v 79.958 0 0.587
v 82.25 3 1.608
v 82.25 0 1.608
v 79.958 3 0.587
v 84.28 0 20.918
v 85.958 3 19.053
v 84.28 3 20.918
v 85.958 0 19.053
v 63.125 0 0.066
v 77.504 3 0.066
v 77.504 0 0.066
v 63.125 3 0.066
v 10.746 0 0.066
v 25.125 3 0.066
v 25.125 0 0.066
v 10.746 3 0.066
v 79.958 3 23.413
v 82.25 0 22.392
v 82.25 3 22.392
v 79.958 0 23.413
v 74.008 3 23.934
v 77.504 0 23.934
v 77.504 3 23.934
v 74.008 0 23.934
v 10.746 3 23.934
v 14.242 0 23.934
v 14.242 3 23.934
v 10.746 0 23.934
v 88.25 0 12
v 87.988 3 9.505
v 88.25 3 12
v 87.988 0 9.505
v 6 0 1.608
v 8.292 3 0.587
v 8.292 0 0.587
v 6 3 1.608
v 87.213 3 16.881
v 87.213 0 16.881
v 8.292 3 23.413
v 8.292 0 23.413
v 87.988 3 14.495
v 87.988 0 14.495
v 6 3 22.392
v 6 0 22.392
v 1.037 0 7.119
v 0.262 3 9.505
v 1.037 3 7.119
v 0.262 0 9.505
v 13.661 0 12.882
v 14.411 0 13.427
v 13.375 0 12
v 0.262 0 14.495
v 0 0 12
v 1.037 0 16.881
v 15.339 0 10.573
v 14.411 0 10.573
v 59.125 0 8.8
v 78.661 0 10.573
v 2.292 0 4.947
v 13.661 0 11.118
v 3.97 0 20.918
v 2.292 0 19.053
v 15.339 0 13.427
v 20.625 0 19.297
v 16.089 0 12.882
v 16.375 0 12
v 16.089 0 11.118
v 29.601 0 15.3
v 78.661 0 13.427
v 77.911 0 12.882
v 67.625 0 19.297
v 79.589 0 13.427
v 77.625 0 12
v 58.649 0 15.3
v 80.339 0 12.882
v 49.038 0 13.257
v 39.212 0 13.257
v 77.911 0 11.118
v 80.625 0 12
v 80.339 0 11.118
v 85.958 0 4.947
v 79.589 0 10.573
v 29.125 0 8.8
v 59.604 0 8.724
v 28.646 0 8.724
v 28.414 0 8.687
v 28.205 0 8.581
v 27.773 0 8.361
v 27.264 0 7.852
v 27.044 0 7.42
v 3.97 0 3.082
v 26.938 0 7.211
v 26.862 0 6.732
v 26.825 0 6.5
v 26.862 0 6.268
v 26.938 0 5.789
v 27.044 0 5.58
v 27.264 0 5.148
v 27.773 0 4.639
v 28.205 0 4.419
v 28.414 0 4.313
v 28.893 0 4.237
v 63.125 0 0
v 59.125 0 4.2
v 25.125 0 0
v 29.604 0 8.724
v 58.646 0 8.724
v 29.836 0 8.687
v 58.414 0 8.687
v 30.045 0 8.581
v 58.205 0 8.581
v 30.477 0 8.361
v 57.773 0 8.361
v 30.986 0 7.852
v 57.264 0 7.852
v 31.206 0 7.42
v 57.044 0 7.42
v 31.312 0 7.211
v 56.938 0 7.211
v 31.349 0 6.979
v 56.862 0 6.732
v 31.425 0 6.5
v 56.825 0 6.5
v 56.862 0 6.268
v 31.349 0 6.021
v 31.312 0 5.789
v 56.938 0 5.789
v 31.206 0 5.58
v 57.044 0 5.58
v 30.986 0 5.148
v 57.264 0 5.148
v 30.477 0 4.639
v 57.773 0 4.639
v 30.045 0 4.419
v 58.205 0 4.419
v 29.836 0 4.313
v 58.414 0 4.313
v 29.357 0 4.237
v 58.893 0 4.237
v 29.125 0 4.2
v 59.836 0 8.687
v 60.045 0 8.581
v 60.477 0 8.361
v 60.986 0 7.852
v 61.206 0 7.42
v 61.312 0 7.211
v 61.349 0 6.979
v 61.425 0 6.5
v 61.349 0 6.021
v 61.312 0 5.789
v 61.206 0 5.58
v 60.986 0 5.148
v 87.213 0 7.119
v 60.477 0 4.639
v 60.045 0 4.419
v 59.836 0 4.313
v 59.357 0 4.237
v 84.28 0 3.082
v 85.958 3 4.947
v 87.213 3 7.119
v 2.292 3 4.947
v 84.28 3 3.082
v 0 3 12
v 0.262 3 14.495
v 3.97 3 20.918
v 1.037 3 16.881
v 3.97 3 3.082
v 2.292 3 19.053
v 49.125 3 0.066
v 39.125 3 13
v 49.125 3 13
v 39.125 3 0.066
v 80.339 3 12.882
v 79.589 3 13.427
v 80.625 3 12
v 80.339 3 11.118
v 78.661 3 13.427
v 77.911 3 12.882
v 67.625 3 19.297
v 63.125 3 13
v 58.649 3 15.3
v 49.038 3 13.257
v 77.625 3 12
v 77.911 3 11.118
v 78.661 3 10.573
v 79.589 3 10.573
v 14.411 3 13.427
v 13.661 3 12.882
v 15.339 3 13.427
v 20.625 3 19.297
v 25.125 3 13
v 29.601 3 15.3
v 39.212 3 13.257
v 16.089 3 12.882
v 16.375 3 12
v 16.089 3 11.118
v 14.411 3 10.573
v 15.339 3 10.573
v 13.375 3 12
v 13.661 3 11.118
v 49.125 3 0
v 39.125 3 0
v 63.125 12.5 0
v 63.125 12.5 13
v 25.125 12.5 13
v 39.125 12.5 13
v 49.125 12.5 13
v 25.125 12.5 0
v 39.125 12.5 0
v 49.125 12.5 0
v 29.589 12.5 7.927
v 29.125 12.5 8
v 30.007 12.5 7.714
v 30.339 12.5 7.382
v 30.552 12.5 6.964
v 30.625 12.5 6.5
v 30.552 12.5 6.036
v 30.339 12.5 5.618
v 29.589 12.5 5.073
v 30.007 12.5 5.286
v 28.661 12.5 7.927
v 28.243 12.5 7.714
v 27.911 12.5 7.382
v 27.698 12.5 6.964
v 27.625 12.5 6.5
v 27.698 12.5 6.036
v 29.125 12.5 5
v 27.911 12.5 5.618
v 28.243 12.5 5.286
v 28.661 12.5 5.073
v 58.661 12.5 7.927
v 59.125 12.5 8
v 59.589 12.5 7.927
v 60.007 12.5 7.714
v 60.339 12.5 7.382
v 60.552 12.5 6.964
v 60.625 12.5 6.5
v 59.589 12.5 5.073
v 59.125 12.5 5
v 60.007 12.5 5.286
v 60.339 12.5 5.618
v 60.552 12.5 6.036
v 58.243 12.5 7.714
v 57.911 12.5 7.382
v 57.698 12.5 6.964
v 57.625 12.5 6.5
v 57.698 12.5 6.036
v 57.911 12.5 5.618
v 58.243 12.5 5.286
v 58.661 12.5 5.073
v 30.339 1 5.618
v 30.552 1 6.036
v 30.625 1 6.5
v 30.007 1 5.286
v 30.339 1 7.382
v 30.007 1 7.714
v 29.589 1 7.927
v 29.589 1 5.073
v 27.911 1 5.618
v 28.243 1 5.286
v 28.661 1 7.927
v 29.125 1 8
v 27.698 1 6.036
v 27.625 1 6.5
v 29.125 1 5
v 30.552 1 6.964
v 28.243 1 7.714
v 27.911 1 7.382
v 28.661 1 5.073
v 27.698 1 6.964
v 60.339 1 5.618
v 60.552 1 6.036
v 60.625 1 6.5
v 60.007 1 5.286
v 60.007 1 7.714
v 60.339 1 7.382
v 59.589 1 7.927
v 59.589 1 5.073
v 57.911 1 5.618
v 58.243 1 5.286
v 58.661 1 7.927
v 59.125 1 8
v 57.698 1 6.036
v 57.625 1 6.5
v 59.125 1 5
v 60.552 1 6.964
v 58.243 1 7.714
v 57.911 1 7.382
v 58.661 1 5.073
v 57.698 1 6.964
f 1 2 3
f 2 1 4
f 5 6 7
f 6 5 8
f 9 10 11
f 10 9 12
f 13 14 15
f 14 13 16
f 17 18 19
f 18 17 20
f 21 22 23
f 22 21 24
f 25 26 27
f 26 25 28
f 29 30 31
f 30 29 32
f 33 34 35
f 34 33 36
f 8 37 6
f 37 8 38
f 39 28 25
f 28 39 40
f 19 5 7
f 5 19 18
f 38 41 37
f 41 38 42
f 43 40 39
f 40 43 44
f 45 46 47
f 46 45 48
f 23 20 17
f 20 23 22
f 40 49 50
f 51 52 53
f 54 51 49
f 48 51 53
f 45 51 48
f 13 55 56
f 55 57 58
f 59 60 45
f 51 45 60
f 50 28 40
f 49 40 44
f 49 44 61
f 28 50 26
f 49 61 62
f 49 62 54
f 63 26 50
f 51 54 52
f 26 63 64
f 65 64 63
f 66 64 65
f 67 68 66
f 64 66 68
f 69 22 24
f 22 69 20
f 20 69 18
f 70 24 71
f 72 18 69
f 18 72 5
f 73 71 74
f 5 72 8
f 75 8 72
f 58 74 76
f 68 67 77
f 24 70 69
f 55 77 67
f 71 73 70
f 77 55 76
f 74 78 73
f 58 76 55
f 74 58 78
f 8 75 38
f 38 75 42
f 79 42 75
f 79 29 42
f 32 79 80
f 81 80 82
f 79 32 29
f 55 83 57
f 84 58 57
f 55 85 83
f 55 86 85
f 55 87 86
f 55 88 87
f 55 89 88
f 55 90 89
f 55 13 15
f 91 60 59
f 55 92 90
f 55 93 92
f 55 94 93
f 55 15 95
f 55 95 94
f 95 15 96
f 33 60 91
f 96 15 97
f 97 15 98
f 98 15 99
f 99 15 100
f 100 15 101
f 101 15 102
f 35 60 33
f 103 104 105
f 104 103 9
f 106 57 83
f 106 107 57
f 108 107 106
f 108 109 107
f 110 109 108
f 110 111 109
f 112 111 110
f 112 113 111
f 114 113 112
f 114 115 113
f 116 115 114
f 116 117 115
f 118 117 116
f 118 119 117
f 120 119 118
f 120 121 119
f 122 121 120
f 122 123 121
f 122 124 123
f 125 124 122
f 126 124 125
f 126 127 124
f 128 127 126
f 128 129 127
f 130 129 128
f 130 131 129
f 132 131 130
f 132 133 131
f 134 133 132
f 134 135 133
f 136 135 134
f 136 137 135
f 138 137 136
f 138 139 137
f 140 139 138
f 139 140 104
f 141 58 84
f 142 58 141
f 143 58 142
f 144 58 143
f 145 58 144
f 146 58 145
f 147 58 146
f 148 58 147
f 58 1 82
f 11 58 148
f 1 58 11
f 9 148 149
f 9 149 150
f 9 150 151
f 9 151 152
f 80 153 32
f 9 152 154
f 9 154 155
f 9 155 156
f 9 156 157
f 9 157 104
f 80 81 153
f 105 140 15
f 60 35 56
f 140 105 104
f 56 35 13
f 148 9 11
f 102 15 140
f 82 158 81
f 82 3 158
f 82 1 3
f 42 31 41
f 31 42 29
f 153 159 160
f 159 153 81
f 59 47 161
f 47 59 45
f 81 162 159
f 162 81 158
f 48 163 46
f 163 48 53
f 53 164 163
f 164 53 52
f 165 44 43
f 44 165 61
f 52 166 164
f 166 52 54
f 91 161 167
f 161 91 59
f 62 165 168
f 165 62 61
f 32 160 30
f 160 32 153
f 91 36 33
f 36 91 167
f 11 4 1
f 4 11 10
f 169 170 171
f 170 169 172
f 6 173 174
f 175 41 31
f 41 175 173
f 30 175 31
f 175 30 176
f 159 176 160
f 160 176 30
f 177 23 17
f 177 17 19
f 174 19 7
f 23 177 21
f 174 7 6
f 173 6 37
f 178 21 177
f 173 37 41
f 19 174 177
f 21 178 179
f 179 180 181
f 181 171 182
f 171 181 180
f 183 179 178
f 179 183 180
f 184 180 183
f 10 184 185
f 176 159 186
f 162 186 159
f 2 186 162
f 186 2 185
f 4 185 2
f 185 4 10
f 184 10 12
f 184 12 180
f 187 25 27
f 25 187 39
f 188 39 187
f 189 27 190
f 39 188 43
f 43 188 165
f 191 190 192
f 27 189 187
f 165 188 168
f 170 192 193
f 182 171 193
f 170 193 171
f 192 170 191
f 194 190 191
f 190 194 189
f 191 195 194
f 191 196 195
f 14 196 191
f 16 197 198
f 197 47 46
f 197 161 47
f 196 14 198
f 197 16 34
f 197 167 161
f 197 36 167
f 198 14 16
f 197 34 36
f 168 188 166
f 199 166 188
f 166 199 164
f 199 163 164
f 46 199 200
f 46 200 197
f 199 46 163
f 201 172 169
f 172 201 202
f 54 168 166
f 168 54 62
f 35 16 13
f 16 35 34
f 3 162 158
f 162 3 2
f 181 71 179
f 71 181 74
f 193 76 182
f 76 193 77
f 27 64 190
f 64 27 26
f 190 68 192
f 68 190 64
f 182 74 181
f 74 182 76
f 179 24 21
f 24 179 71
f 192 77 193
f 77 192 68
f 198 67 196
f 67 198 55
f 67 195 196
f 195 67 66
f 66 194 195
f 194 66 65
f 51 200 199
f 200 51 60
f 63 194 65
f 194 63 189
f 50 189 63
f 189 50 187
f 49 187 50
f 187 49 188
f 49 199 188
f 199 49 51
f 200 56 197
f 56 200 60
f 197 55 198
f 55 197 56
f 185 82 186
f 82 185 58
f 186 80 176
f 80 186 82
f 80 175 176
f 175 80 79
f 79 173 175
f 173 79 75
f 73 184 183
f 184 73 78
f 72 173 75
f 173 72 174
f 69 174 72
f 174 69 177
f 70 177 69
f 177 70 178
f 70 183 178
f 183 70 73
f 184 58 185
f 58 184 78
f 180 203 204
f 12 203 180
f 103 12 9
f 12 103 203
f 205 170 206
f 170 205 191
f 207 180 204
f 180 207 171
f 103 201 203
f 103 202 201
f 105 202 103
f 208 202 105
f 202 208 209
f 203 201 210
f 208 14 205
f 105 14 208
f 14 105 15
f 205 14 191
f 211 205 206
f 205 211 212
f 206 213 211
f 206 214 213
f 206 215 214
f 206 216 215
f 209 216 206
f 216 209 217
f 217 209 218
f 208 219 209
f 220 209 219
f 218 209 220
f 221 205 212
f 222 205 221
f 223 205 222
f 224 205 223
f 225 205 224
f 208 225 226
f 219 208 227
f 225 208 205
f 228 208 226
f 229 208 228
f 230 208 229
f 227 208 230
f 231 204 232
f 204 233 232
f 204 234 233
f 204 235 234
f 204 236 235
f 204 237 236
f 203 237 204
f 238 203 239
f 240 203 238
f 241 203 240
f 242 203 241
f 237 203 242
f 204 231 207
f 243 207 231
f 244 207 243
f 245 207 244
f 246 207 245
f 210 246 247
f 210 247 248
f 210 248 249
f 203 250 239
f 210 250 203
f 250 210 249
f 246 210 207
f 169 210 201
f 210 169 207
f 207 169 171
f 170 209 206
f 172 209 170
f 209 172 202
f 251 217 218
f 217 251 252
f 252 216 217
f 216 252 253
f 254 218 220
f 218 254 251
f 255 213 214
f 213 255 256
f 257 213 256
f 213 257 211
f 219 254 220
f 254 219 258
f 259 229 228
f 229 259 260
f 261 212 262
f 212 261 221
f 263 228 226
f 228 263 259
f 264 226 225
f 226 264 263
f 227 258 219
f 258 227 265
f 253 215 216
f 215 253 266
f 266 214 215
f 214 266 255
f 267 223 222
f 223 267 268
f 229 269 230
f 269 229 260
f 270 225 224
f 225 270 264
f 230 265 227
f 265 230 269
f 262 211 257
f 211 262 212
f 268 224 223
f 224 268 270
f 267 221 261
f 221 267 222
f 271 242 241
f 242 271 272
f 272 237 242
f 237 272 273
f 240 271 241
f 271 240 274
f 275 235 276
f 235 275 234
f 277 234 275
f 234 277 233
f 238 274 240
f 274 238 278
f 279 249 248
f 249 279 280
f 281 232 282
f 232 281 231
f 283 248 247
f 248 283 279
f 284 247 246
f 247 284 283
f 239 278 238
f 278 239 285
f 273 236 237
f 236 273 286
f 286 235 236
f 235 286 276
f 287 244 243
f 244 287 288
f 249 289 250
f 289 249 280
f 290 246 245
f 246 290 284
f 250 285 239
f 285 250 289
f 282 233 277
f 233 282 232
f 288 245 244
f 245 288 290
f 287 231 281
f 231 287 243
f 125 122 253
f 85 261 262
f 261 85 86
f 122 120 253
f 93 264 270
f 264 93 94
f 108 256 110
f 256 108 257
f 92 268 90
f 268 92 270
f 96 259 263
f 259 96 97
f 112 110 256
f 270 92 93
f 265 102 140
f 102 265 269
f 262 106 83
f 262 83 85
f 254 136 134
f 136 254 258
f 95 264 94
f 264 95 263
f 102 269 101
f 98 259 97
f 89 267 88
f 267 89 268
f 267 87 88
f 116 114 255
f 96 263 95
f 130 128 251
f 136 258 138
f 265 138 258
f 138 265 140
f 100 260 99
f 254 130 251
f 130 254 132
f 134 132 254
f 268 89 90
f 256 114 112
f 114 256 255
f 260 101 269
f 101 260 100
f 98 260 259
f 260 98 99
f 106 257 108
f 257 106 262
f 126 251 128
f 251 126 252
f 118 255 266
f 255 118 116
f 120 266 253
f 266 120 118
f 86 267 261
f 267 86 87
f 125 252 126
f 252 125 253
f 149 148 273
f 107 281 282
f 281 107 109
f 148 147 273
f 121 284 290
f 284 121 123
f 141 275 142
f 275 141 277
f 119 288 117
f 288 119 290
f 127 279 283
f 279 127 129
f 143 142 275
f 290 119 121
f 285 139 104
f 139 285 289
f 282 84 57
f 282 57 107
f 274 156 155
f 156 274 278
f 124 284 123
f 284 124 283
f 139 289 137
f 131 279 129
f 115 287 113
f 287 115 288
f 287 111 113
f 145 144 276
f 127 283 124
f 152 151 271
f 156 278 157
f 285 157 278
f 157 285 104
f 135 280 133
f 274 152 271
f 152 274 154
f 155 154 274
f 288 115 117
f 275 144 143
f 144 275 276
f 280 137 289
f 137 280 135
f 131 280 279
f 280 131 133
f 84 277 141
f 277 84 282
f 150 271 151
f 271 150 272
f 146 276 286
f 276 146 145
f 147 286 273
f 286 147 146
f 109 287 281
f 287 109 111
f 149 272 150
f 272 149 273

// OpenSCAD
// file: ../basic_scad/utils.scad
// Author: Mihai Oltean, www.tcreate.org, mihai.oltean@gmail.com
// More details: jenny5.org
// Source: github.com/jenny5-robot
// MIT License
//--------------------------------------------------------------

module colt(radius, height)
{
	difference(){
		cube ([radius, radius, height]);
		cylinder	(h = height, r = radius, $fn = 30);
	}
}
/////////////////////////////////////////////////////////////////////////////////////////////////////////////////////////
module colt_sferic(radius)
{
	difference(){
		cube ([radius, radius, radius]);
		sphere(r = radius, $fn = 40);
	}
}
/////////////////////////////////////////////////////////////////////////////////////////////////////////////////////////
module coloana_sferica(height, radius)
{
		difference(){
			cube ([height, height, height]);
			cylinder(h= height, r = radius, $fn = 50);
		}
}
/////////////////////////////////////////////////////////////////////////////////////////////////////////////////////////
// file: ../basic_scad/config.scad
// Author: Mihai Oltean, www.tcreate.org, mihai.oltean@gmail.com
// More details: jenny5.org
// Source: github.com/jenny5-robot
// MIT License
//--------------------------------------------------------------

aluminium_color = "Silver";
screw_color = "LightSlateGray";
frame_color = aluminium_color;
shaft_color = "Silver";
plastic_color = "LimeGreen";
pulley_color = "DarkSlateGray";
// file: ../basic_scad/params_webcam.scad
// Author: Mihai Oltean, www.tcreate.org, mihai.oltean@gmail.com
// More details: jenny5.org
// Source: github.com/jenny5-robot
// MIT License
//--------------------------------------------------------------

c920_length = 94;
c920_height = 29;
c920_depth = 24;

c920_size = [c920_length, c920_depth, c920_height];

c920_dist_between_holder_holes = 64.25;

c920_dist_to_cable = 34;
// file: ../basic_scad/webcam_support.scad
// Author: Mihai Oltean, www.tcreate.org, mihai.oltean@gmail.com
// More details: jenny5.org
// Source: github.com/jenny5-robot
// MIT License
//--------------------------------------------------------------

include <config.scad>
include <params_screws_nuts_washers.scad>
use <basic_components.scad>
include <params_basic_components.scad>
include <params_webcam.scad>

//--------------------------------------------------------------
module c920_support()
{
  color(plastic_color) 
  difference(){
    translate ([c920_depth / 2, wall_thick_3, c920_depth / 2])
      rotate([90, 0, 0]) 
        hull(){
          cylinder(h = wall_thick_3, r = c920_depth / 2);
          translate ([c920_dist_between_holder_holes, 0, 0]) cylinder(h = wall_thick_3, r = c920_depth / 2);
        }
        // remove some parts in order to avoid interference with US sensor
        translate ([c920_dist_between_holder_holes / 2 + c920_depth / 2, 0, 60] - display_tolerance_y) rotate([-90, 0, 0]) cylinder (h = wall_thick_3 + 2 * display_tolerance, r = c920_length / 2);
        // holder screws
        translate ([c920_length / 2 - c920_dist_between_holder_holes / 2, 0, c920_depth / 2] - display_tolerance_y) rotate ([-90, 0, 0]) cylinder (h = wall_thick_3 + 2 * display_tolerance, r = m3_screw_radius, $fn = 10);
        translate ([c920_length / 2 + c920_dist_between_holder_holes / 2, 0, c920_depth / 2] - display_tolerance_y) rotate ([-90, 0, 0]) cylinder (h = wall_thick_3 + 2 * display_tolerance, r = m3_screw_radius, $fn = 10);
  }
}
//--------------------------------------------------------------


c920_support();
// file: ../basic_scad/stepper_motors.scad
// Author: Mihai Oltean, www.tcreate.org, mihai.oltean@gmail.com
// More details: jenny5.org
// Source: github.com/jenny5-robot
// MIT License
//--------------------------------------------------------------

use <basic_components.scad>
include <params_stepper_motors.scad>
include <params_basic_components.scad>
include <params_screws_nuts_washers.scad>

///////////////////////////////////////////////////////////////////////////////////////////////////////////////////////////////
module nema_motor(motor_width, motor_height, shaft_length = nema_17_shaft_length, shaft_radius = m5_screw_radius, top_cylinder_radius, top_cylinder_height = 2, nema_holes)
{

	latura_interioara = motor_width + 12;
	latura_exterioara = latura_interioara + 15;
	union (){
		difference(){
			union(){
				color("Gainsboro") translate ([-motor_width / 2, -motor_width / 2, 0]) cube([motor_width, motor_width, 10]);
				translate([0, 0, 10]) color("black")  translate ([-motor_width / 2, -motor_width / 2, 0]) cube([motor_width, motor_width, motor_height - 20]);
				translate([0, 0, motor_height - 10]) color("Gainsboro")  translate ([-motor_width / 2, -motor_width / 2, 0]) cube([motor_width, motor_width, 10]);
				translate([0, 0, motor_height])color("Gainsboro") cylinder_empty (top_cylinder_height, top_cylinder_radius, 5);
	// ax
			color("Silver")cylinder (h = motor_height + shaft_length, r = shaft_radius, $fn = 30); 

			}
            /*
			color("black")  translate ([motor_width / 2, motor_width / 2, 10] - display_tolerance_z) 
rotate ([0, 0, 45]) translate ([- latura_exterioara / 2, -latura_exterioara / 2, 0]) cube_empty(latura_interioara - 3, latura_exterioara, motor_height - 20 + 2 * display_tolerance);
			color("Gainsboro")  translate ([motor_width / 2, motor_width / 2, 0] - display_tolerance_z) 
rotate ([0, 0, 45]) translate ([- latura_exterioara / 2, -latura_exterioara / 2, 0]) cube_empty(latura_interioara, latura_exterioara, 10 + display_tolerance);
			color("Gainsboro")  translate ([motor_width / 2, motor_width / 2, motor_height - 10]) 
rotate ([0, 0, 45]) translate ([- latura_exterioara / 2, -latura_exterioara / 2, 0]) cube_empty(latura_interioara, latura_exterioara, 10 + display_tolerance);
            */
		// gauri baza
			  for (i=[1:4])
                translate (nema_holes[i]) cylinder (r = m5_screw_radius, h = 5, $fn = 20); 
		// gauri m3 top
			// translate ([-motor_width / 2, -motor_width / 2, 0]) translate ([0, 0, motor_height]) gauri_nema17(3, m3_screw_radius);
            for (i=[1:4])
                translate (nema_holes[i] + [0, 0, motor_height - 4]) cylinder (r = m3_screw_radius, h = 5, $fn = 10); 
		// gaura ax jos
			color("Silver") translate (- display_tolerance_z) cylinder (h = 3, r = 5, $fn = 30); 
		// taie axul
			translate ([motor_width / 2 + 2, motor_width / 2 - 2, motor_height]) cube ([2, 4, shaft_length]);
		}
			// cables
		translate ([-3, motor_width / 2 + 10, 3]) rotate([90, 0, 0]) color("Red") cylinder (h= 10, r = 0.5);
		translate ([-1, motor_width / 2 + 10, 3]) rotate([90, 0, 0]) color("Black") cylinder (h= 10, r = 0.5);
		translate ([1, motor_width / 2 + 10, 3]) rotate([90, 0, 0]) color("Blue") cylinder (h= 10, r = 0.5);
		translate ([3, motor_width / 2 + 10, 3]) rotate([90, 0, 0]) color("Green") cylinder (h= 10, r = 0.5);
	}
}
///////////////////////////////////////////////////////////////////////////////////////////////////////////////////////////////
module nema_motor_with_gearbox(motor_width, motor_height, gearbox_length, gearbox_radius, gearbox_base_height, gearbox_screw_holes_position, gearbox_shaft_length, gearbox_shaft_radius)
{
	nema_motor(motor_width, motor_height);
    // gearbox base
    if (gearbox_base_height > 0)
        color ("gray") translate ([-motor_width / 2, -motor_width / 2, motor_height]) cube([motor_width, motor_width, gearbox_base_height]);
// gearbox
	difference(){
        color ("gray") translate ([0, 0, motor_height + gearbox_base_height]) cylinder ( h =  gearbox_length, r = gearbox_radius, $fn = 50);
// gearbox holes
        for (i=[0:4])
    translate ([0, 0, motor_height + gearbox_length + gearbox_base_height - 3] + gearbox_screw_holes_position[i]) cylinder (h = 4, r = m3_screw_radius, $fn = 20);
	}
// gearbox shaft
	color("black") translate ([0, 0, motor_height + gearbox_length + gearbox_base_height]) cylinder ( h =  gearbox_shaft_length, r = gearbox_shaft_radius, $fn = 30);

}
///////////////////////////////////////////////////////////////////////////////////////////////////////////////////////////////
module nema_17()
{
	nema_motor(nema_17_42BYGHW804_width, nema_17_42BYGHW804_height, nema_17_42BYGHW804_shaft_length, nema_17_42BYGHW804_shaft_radius, nema_17_42BYGHW804_top_radius, nema_17_42BYGHW804_top_cylinder_height, gauri_nema_17);
}
///////////////////////////////////////////////////////////////////////////////////////////////////////////////////////////////
module nema_14_39BYGL215A()
{
	nema_motor(nema_14_39BYGL215A_width, nema_14_39BYGL215A_height, nema_14_39BYGL215A_shaft_length, nema_14_39BYGL215A_shaft_radius, nema_14_39BYGL215A_top_radius, nema_14_39BYGL215A_top_cylinder_height, nema_14_39BYGL215A_screw_hole_position);
}
///////////////////////////////////////////////////////////////////////////////////////////////////////////////////////////////
module nema_17_42BYGHW804()
{
	nema_motor(nema_17_42BYGHW804_width, nema_17_42BYGHW804_height, nema_17_42BYGHW804_shaft_length, nema_17_42BYGHW804_shaft_radius, nema_17_42BYGHW804_top_radius, nema_17_42BYGHW804_top_cylinder_height, gauri_nema_17);
}
///////////////////////////////////////////////////////////////////////////////////////////////////////////////////////////////
module nema_23_57BYGH603()
{
	nema_motor(nema_23_57BYGH603_width, nema_23_57BYGH603_height, nema_23_57BYGH603_shaft_length);
}
///////////////////////////////////////////////////////////////////////////////////////////////////////////////////////////////
module nema_17_with_screw()
{
	nema_motor(nema_17_width, nema_17_height, 200, 4);
}
///////////////////////////////////////////////////////////////////////////////////////////////////////////////////////////////
module nema_11()
{
	nema_motor(nema_11_width, nema_11_height);
}
////////////////////////////////////////////////////////////////////////////////////////////////////////////////////////////////
module nema_11_with_27_1_gearbox()
{
	nema_motor_with_gearbox(nema_11_width, nema_11_height, nema_11_27_1_gearbox_length, nema_11_motor_gearbox_radius, 0, gearbox_nema_11_holes_position, nema_11_gearbox_shaft_length, 3);
}
///////////////////////////////////////////////////////////////////////////////////////////////////////////////////////////////
module nema_11_with_13_1_gearbox()
{
	nema_motor_with_gearbox(nema_11_width, nema_11_height, nema_11_13_1_gearbox_length, nema_11_motor_gearbox_radius, 0, gearbox_nema_11_holes_position, nema_11_gearbox_shaft_length, 3);
}
///////////////////////////////////////////////////////////////////////////////////////////////////////////////////////////////
module nema_17_with_5_1_gearbox()
{
	nema_motor_with_gearbox(nema_17_width, nema_17_height, nema_17_5_1_gearbox_height, nema_17_motor_gearbox_radius, nema_17_gearbox_base_height, gearbox_nema_17_holes_position, nema_17_shaft_length, nema_17_gearbox_shaft_radius);
}
///////////////////////////////////////////////////////////////////////////////////////////////////////////////////////////////
module nema_17_with_13_1_gearbox()
{
	nema_motor_with_gearbox(nema_17_width, nema_17_height, nema_17_13_1_gearbox_height, nema_17_motor_gearbox_radius, nema_17_gearbox_base_height, gearbox_nema_17_holes_position, nema_17_shaft_length, nema_17_gearbox_shaft_radius);
}
///////////////////////////////////////////////////////////////////////////////////////////////////////////////////////////////
module nema_17_with_13_1_gearbox_and_screw(gearbox_shaft_length = 100)
{
    nema_17_with_13_1_gearbox();
    //conector 
        color ("gray") translate ([0, 0, nema_17_height + nema_17_gearbox_base_height + nema_17_13_1_gearbox_height]) cylinder (h = 25, r = 6);
    // screw
    color ("gray") translate ([0, 0, nema_17_height + nema_17_gearbox_base_height + nema_17_13_1_gearbox_height + nema_17_gearbox_shaft_length]) cylinder (h = gearbox_shaft_length, r = 4);
}
///////////////////////////////////////////////////////////////////////////////////////////////////////////////////////////////
//nema_17();

//nema_17_42BYGHW804();

nema_11_with_27_1_gearbox();

//nema_17_with_5_1_gearbox();

//nema_17_with_13_1_gearbox_and_screw();
// file: ../basic_scad/params_basic_components.scad
// Author: Mihai Oltean, www.tcreate.org, mihai.oltean@gmail.com
// More details: jenny5.org
// Source: github.com/jenny5-robot
// MIT License
//--------------------------------------------------------------

spring_length = 20;

smooth_rod_8_radius = 4;
smooth_rod_10_radius = 5;
smooth_rod_12_radius = 6;

tolerance = 0.1;
display_tolerance = 1;

overlap_tolerance = 0.01;


wall_thick_1 = 1;
wall_thick_2 = 2;
wall_thick_3 = 3;
wall_thick_4 = 4;
wall_thick_5 = 5;
wall_thick_5_5 = 5.5;
wall_thick_6 = 6;
wall_thick_7 = 7;
wall_thick_8 = 8;
wall_thick_9 = 9;
wall_thick_10 = 10;
wall_thick_12 = 10;

wrench_radius = 11;

ghidaj_radius = 4;
ghidaj_radius_12 = 6;

canal_diameter = 8.22;
canal_height = 2.2;

filament_radius = 0.9;

bowden_tube_radius = 2.5;

m3_tolerance = 0.1;

latura_mare_L = 40;
latura_mica_L = 15;
grosime_perete_L = 3;

latura_L_50x50 = 50;
latura_L_40x40 = 40;

latura_U_50x50 = 50;
latura_U_40x40 = 40;


tolerance_z = [0, 0, tolerance];
tolerance_x = [tolerance, 0, 0];
tolerance_y = [0, tolerance, 0];

display_tolerance_z = [0, 0, display_tolerance];
display_tolerance_x = [display_tolerance, 0, 0];
display_tolerance_y = [0, display_tolerance, 0];

display_tolerance_xz = [display_tolerance, 0, display_tolerance];
display_tolerance_xy = [display_tolerance, display_tolerance, 0];
display_tolerance_yz = [0, display_tolerance, display_tolerance];

display_tolerance_xyz = [display_tolerance, display_tolerance, display_tolerance];
// file: ../basic_scad/params_stepper_motors.scad
// Author: Mihai Oltean, www.tcreate.org, mihai.oltean@gmail.com
// More details: jenny5.org
// Source: github.com/jenny5-robot
// MIT License
//--------------------------------------------------------------

nema_17_width = 42.3;
nema_17_motor_height_sparkfun = 36;
nema_17_motor_hole_radius_sparkfun  = 14;
nema_17_motor_hole_radius_camiel  = 12;
nema_17_dist_between_screw_holes = 31;
nema_17_height = 47;
nema_17_shaft_length = 24;

nema_14_width = 39.3;
nema_14_motor_hole_radius  = 11;
nema_14_dist_between_screw_holes = 31;
nema_14_height = 47;
nema_14_shaft_length = 20;

nema_11_width = 28;
nema_11_motor_hole_radius = 11;
nema_11_dist_between_screw_holes = 23;
nema_11_height = 32;
nema_11_shaft_length = 18;
nema_11_shaft_radius = 3;

nema_11_27_1_gearbox_length = 34;
nema_11_13_1_gearbox_length = 25;
nema_11_gearbox_base_height = 4;
nema_11_motor_gearbox_radius = 14;
nema_11_motor_gearbox_hole_radius = 9;
nema_11_gearbox_dist_between_screw_holes = 22 / sqrt(2);
nema_11_gearbox_shaft_length = 18;

nema_11_with_27_1_gearbox_height = nema_11_height + nema_11_gearbox_base_height + nema_11_27_1_gearbox_length;
nema_11_with_13_1_gearbox_height = nema_11_height + nema_11_gearbox_base_height + nema_11_13_1_gearbox_length;

nema_17_motor_gearbox_radius = 18;
nema_17_gearbox_dist_between_screw_holes = 20;
nema_17_5_1_gearbox_height = 23;
nema_17_13_1_gearbox_height = 30;

nema_17_gearbox_base_height = 5;
nema_17_gearbox_shaft_length = 18;
nema_17_gearbox_shaft_radius = 4;
nema_17_gearbox_motor_hole_radius = 11;

nema_17_with_5_1_gearbox_height = nema_17_height + nema_17_gearbox_base_height + nema_17_5_1_gearbox_height;
nema_17_with_13_1_gearbox_height = nema_17_height + nema_17_gearbox_base_height + nema_17_13_1_gearbox_height;

nema_17_42BYGHW804_width = 42.3;
nema_17_42BYGHW804_height = 47;
nema_17_42BYGHW804_top_radius = 11;
nema_17_42BYGHW804_top_cylinder_height = 2;
nema_17_42BYGHW804_dist_between_screw_holes = 31;
nema_17_42BYGHW804_shaft_length = 22;
nema_17_42BYGHW804_shaft_radius = 2.5;

nema_23_57BYGH603_width = 56.4;
nema_23_57BYGH603_height = 78;
nema_23_57BYGH603_hole_radius  = 19.1;
nema_23_57BYGH603_dist_between_screw_holes = 47.14;
nema_23_57BYGH603_shaft_length = 21;

nema_14_39BYGL215A_width = 39;
nema_14_39BYGL215A_height = 34;
nema_14_39BYGL215A_top_radius = 11;
nema_14_39BYGL215A_dist_between_screw_holes = 31;
nema_14_39BYGL215A_shaft_length = 50;
nema_14_39BYGL215A_shaft_radius = 2.5;
nema_14_39BYGL215A_top_cylinder_height = 2;


nema_11_sizes = [nema_11_width, nema_11_width, nema_11_height];

gauri_nema_17 = [
[0, 0, 0], 
[-nema_17_dist_between_screw_holes / 2, -nema_17_dist_between_screw_holes / 2, 0], 
[-nema_17_dist_between_screw_holes / 2, nema_17_dist_between_screw_holes / 2, 0], 
[nema_17_dist_between_screw_holes / 2, -nema_17_dist_between_screw_holes / 2, 0], 
[nema_17_dist_between_screw_holes / 2, nema_17_dist_between_screw_holes / 2, 0]
];

nema_14_39BYGL215A_screw_hole_position = [
[0, 0, 0], 
[-nema_14_39BYGL215A_dist_between_screw_holes / 2, -nema_14_39BYGL215A_dist_between_screw_holes / 2, 0], 
[-nema_14_39BYGL215A_dist_between_screw_holes / 2, nema_14_39BYGL215A_dist_between_screw_holes / 2, 0], 
[nema_14_39BYGL215A_dist_between_screw_holes / 2, -nema_14_39BYGL215A_dist_between_screw_holes / 2, 0], 
[nema_14_39BYGL215A_dist_between_screw_holes / 2, nema_14_39BYGL215A_dist_between_screw_holes / 2, 0]
];


gauri_nema_11 = [
[0, 0, 0], 
[-nema_11_dist_between_screw_holes / 2, -nema_11_dist_between_screw_holes / 2, 0], 
[-nema_11_dist_between_screw_holes / 2, nema_11_dist_between_screw_holes / 2, 0], 
[nema_11_dist_between_screw_holes / 2, -nema_11_dist_between_screw_holes / 2, 0], 
[nema_11_dist_between_screw_holes / 2, nema_11_dist_between_screw_holes / 2, 0]
];

gearbox_nema_11_holes_position = [[0, 0, 0], 
[-nema_11_gearbox_dist_between_screw_holes / 2, -nema_11_gearbox_dist_between_screw_holes / 2, 0], [-nema_11_gearbox_dist_between_screw_holes / 2, nema_11_gearbox_dist_between_screw_holes / 2, 0], [nema_11_gearbox_dist_between_screw_holes / 2, -nema_11_gearbox_dist_between_screw_holes / 2, 0], [nema_11_gearbox_dist_between_screw_holes / 2, nema_11_gearbox_dist_between_screw_holes / 2, 0]];

gearbox_nema_17_holes_position = [
[0, 0, 0], 
[-nema_17_gearbox_dist_between_screw_holes / 2, -nema_17_gearbox_dist_between_screw_holes / 2, 0], 
[-nema_17_gearbox_dist_between_screw_holes / 2, nema_17_gearbox_dist_between_screw_holes / 2, 0], 
[nema_17_gearbox_dist_between_screw_holes / 2, -nema_17_gearbox_dist_between_screw_holes / 2, 0], 
[nema_17_gearbox_dist_between_screw_holes / 2, nema_17_gearbox_dist_between_screw_holes / 2, 0]
];
// file: ../basic_scad/params_screws_nuts_washers.scad
// Author: Mihai Oltean, www.tcreate.org, mihai.oltean@gmail.com
// More details: jenny5.org
// Source: github.com/jenny5-robot
// MIT License
//--------------------------------------------------------------


m2_screw_radius = 1;
m2_nut_radius = 2.2;
m2_nut_height = 1.6;
m2_nut_thick = m2_nut_height;

m3_screw_radius = 1.5;
m3_nut_radius = 3.1;
m3_nut_height = 2.3;
m3_nut_thick = m3_nut_height;
m3_autolock_nut_thick = 4.2;

m4_screw_radius = 2;
m4_nut_radius = 4;
m4_auto_lock_nut_height = 5;
m4_nut_height = 3.25;
m4_nut_thick = 3.25;

m5_screw_radius = 2.5;
m5_nut_radius = 4.6;
m5_nut_height = 4;

m6_screw_radius = 3;
m6_nut_radius = 5.65;
m6_nut_thick = 5;
m6_nut_slim_thick = 3;
m6_autolock_nut_thick = 6;
m6_long_nut_thick = 9;

m8_screw_head_height = 5.7;
m8_screw_radius = 3.9;
m8_nut_small_width = 12.8;
m8_nut_radius = 7.3;
m8_slim_nut_small_width = 12.4;
m8_nut_thick = 6.5;
m8_nut_height = m8_nut_thick;
m8_slim_nut_height = 5.5;
m8_screw_head_radius = 6.5;
m8_autolock_nut_thick = 8;

m10_screw_radius = 5;
m10_nut_thick = 8;
m10_nut_radius = 9.8;

M12_screw_radius = 6;
M12_nut_thick = 8;
M12_nut_radius = 11;
M12_long_nut_thick = 36;
M12_autolock_nut_thick = 14;

m10_long_nut_radius = 9.71;
m10_long_nut_height = 29.8;

m10_long_thick_nut_radius = 7.41;
m10_long_thick_nut_height = 30.4;

m12_plastic_nut_radius = 10.45;
m12_plastic_nut_height = 23.3;

tr12_3_nut_radius = 11;
tr12_3_nut_height = 18.1;

washer_5 = 0.97;

washer_4_12_radius = 6;
washer_4_12_external_radius = 6;
washer_4_12_thick = 1;
washer_4_thick = 1;
washer_4_12_internal_radius = 2.15;

washer_4_9_external_radius = 4.5;
washer_4_9_internal_radius = 2.15;
washer_4_9_thick = 1;

washer_6_thick = 1.7;
washer_8_thick = 1.5;
washer_5_thick = 1;

washer_10_height = 2;
washer_10_thick = 2;

washer_12_thick = 2;

washer_5_15_external_radius = 7.5;
washer_5_15_thick = 1;
washer_5_thick = 1;
washer_5_15_internal_radius = 2.65;
// file: params_gripper.scad
// Author: Mihai Oltean, www.tcreate.org, mihai.oltean@gmail.com
// More details: jenny5.org
// Source: github.com/jenny5-robot
// MIT License
//--------------------------------------------------------------


spacer_between_fingers = 2;


finger_thick = 6;
finger_first_segment_length = 44;
finger_second_second_length = 75;
finger_width = 10;


U_finger_thick = 3;
U_pusher_base_size = [4 * spacer_between_fingers + 3 * finger_thick + 2 * U_finger_thick, 20, 8.2];
U_pusher_height = 25;

gripper_motor_support_size = [37, 38, 8];//U_pusher_base_size[0] + 2 * spacer_between_fingers, 38, 8];

echo(gripper_motor_support_size);

gripper_lateral_sheet_size = [75, gripper_motor_support_size[1], 4];

finger_angle = 46;
// main file
// Author: Mihai Oltean, www.tcreate.org, mihai.oltean@gmail.com
// More details: jenny5.org
// Source: github.com/jenny5-robot
// MIT License
//--------------------------------------------------------------

include <params_gripper.scad>
include <../basic_scad/params_screws_nuts_washers.scad>
use <../basic_scad/screws_nuts_washers.scad>
include <../basic_scad/params_stepper_motors.scad>
include <../basic_scad/params_basic_components.scad>
use <../basic_scad/stepper_motors.scad>
use <../basic_scad/webcam_support.scad>
include <../basic_scad/params_webcam.scad>

//-----------------------------------------------------------------------------------
module gripper_lateral_support()
{
	difference(){
		union(){
			cube(gripper_lateral_sheet_size);
            difference(){
                translate ([0, -10, 0]) cube([10, gripper_lateral_sheet_size[1] + 20, gripper_lateral_sheet_size[2]]);
                // holes for screws
                translate([5, -5, 0]-display_tolerance_z) cylinder (h = gripper_lateral_sheet_size[2] + 2 * display_tolerance, r = m4_screw_radius, $fn = 20); 
                translate([5, gripper_lateral_sheet_size[1] + 5, 0]-display_tolerance_z) cylinder (h = gripper_lateral_sheet_size[2] + 2 * display_tolerance, r = m4_screw_radius, $fn = 20); 
            }
		}
        // pusher translation hole
        hull(){
        translate([10, gripper_lateral_sheet_size[1] / 2, 0] - display_tolerance_z) cylinder (h = gripper_lateral_sheet_size[2] + 2 * display_tolerance, r = m4_screw_radius, $fn = 10);
        translate([40, gripper_lateral_sheet_size[1] / 2, 0] - display_tolerance_z) cylinder (h = gripper_lateral_sheet_size[2] + 2 * display_tolerance, r = m4_screw_radius, $fn = 10);
        }
        
        // base holes
        translate([gripper_lateral_sheet_size[0] - gripper_motor_support_size[2] / 2, 9, 0] - display_tolerance_z) cylinder (h = gripper_lateral_sheet_size[2] + 2 * display_tolerance, r = m3_screw_radius, $fn = 10);
        translate([gripper_lateral_sheet_size[0] - gripper_motor_support_size[2] / 2, gripper_lateral_sheet_size[1] - 9, 0] - display_tolerance_z) cylinder (h = gripper_lateral_sheet_size[2] + 2 * display_tolerance, r = m3_screw_radius, $fn = 10);
        
        // holes for bone fixing
        translate([gripper_lateral_sheet_size[0] - 25, gripper_lateral_sheet_size[1] / 2 - 15, 0] - display_tolerance_z) cylinder (h = gripper_lateral_sheet_size[2] + 2 * display_tolerance, r = m3_screw_radius, $fn = 10);
        translate([gripper_lateral_sheet_size[0] - 25, gripper_lateral_sheet_size[1] / 2 + 15, 0] - display_tolerance_z) cylinder (h = gripper_lateral_sheet_size[2] + 2 * display_tolerance, r = m3_screw_radius, $fn = 10);
        
	}
}
//-----------------------------------------------------------------------------------
module finger ()
{
    // base finger; or the first segment
	difference(){
		hull(){
			cylinder(r = finger_width / 2, h = finger_thick );
			translate([finger_first_segment_length, 0, 0 ]) cylinder(r = finger_width / 2, h = finger_thick);
		}
        // slide hole
		translate(-display_tolerance_z) 
            hull(){
                cylinder (h = finger_thick + 2 * display_tolerance, r = m4_screw_radius); 
                translate ([20, 0, 0]) cylinder (h = finger_thick + 2 * display_tolerance, r = m4_screw_radius); 
            }
        
// m4 screw hole for finger rotation
		translate([finger_first_segment_length, 0, 0] - display_tolerance_z) cylinder (r = m4_screw_radius, h = finger_thick + 2 * display_tolerance, $fn = 30);
	}
    // finger, second segment
    difference(){
	translate([finger_first_segment_length, 0, 0]) rotate([0, 0, finger_angle]) 
        difference(){
            hull(){
                cylinder(r = finger_width / 2, h = finger_thick );
                translate([finger_second_second_length, 0, 0 ]) cylinder(r = finger_width / 2, h = finger_thick);
            }
//            translate([finger_second_second_length / 2, 38, 0]) cylinder (r = 32, h = finger_thick, $fn = 100);
        }
    	translate([finger_first_segment_length, 0, 0] - display_tolerance_z) cylinder (r = m4_screw_radius, h = finger_thick + 2 * display_tolerance, $fn = 30);
    }
}
//-----------------------------------------------------------------------------------
module finger_with_button_support ()
{
    // base finger; or the first segment
	difference(){
		hull(){
			cylinder(r = finger_width / 2, h = finger_thick );
			translate([finger_first_segment_length, 0, 0 ]) cylinder(r = finger_width / 2, h = finger_thick);
		}
        // slide hole
		translate(-display_tolerance_z) 
            hull(){
                cylinder (h = finger_thick + 2 * display_tolerance, r = m4_screw_radius); 
                translate ([20, 0, 0]) cylinder (h = finger_thick + 2 * display_tolerance, r = m4_screw_radius); 
            }
        
// m4 screw hole for finger rotation
		translate([finger_first_segment_length, 0, 0] - display_tolerance_z) cylinder (r = m4_screw_radius, h = finger_thick + 2 * display_tolerance, $fn = 30);
	}
    // finger, second segment
    difference(){
	translate([finger_first_segment_length, 0, 0]) rotate([0, 0, finger_angle]) 
        difference(){
            union(){
                hull(){
                    cylinder(r = finger_width / 2, h = finger_thick );
                    translate([finger_second_second_length - 20, -finger_width / 2, 0 ]) cube([1, finger_width, finger_thick]);
                }
                translate([finger_second_second_length - 20, -finger_width / 2, 0 ]) 
                difference(){
                    cube([20, finger_width, 12]);
                    translate([10, 0, 6] - display_tolerance_y) rotate([-90, 0, 0]) cylinder (h = finger_width + 2 * display_tolerance, r = 3.4, $fn = 30);
                    translate([10, 0, 6] - display_tolerance_y) rotate([-90, 0, 0]) cylinder (h = 5 + display_tolerance, r = 5, $fn = 30);
                }
            }
//            translate([finger_second_second_length / 2, 38, 0]) cylinder (r = 32, h = finger_thick, $fn = 100);
        }
    	translate([finger_first_segment_length, 0, 0] - display_tolerance_z) cylinder (r = m4_screw_radius, h = finger_thick + 2 * display_tolerance, $fn = 30);
    }
}
//-----------------------------------------------------------------------------------
module fore_finger()
{
        difference(){
            hull(){
                cylinder(r = finger_width / 2, h = finger_thick );
                translate([finger_second_second_length, 0, 0 ]) cylinder(r = finger_width / 2, h = finger_thick);
            }
        
    	translate(- display_tolerance_z) cylinder (r = m4_screw_radius, h = finger_thick + 2 * display_tolerance, $fn = 30);
        }
}
//-----------------------------------------------------------------------------------
module fore_fingers()
{
    fore_finger();
    translate ([0, 0, 2 * spacer_between_fingers + 2 * finger_thick]) fore_finger();
    translate ([finger_second_second_length - 15, -4, finger_thick]) cube([15, 4, 2 * spacer_between_fingers + finger_thick]);
}
//-----------------------------------------------------------------------------------
module U_pusher()
{
    // base
    difference(){
        cube(U_pusher_base_size);
        // screw hole for push screw
        translate([U_pusher_base_size[0] / 2, U_pusher_base_size[1] / 2, 0] - display_tolerance_z)
        cylinder (h = U_pusher_base_size[2] + 2 * display_tolerance, r = 2.5, $fn = 20);
        // screw hole for stopper
        translate ([U_pusher_base_size[0] / 2, 0, U_pusher_base_size[2] / 2] - display_tolerance_y) rotate([-90, 0, 0]) cylinder (h =  U_pusher_base_size[1] / 2, r = m4_screw_radius, $fn = 20);
        // nut
        hull(){
            translate ([U_pusher_base_size[0] / 2, 3, U_pusher_base_size[2] / 2]) rotate([-90, 30, 0]) cylinder (h =  m4_nut_thick, r = m4_nut_radius, $fn = 6);
            translate ([U_pusher_base_size[0] / 2, 3, U_pusher_base_size[2]]) rotate([-90, 30, 0]) cylinder (h =  m4_nut_thick, r = m4_nut_radius, $fn = 6);
        }
    }
    
    // pusher fingers
    difference(){
        union(){
            translate ([0, U_pusher_base_size[1] / 2, U_pusher_height]) rotate ([0, 90, 0]) cylinder ( h = U_finger_thick, r = U_pusher_base_size[1] / 2, $fn = 30);
            cube([U_finger_thick, U_pusher_base_size[1], U_pusher_height]);
            // other side
            translate ([U_pusher_base_size[0] - U_finger_thick, U_pusher_base_size[1] / 2, U_pusher_height]) rotate ([0, 90, 0]) cylinder ( h = U_finger_thick, r = U_pusher_base_size[1] / 2, $fn = 30);
            translate ([U_pusher_base_size[0] - U_finger_thick, 0, 0]) cube([U_finger_thick, U_pusher_base_size[1], U_pusher_height]);
        }
        // shaft hole
        translate([0, U_pusher_base_size[1] / 2, U_pusher_height] - display_tolerance_x) rotate ([0, 90, 0]) cylinder ( h = U_pusher_base_size[0] + 2 * display_tolerance, r = m4_screw_radius, $fn = 30);

    }
    
}
//-----------------------------------------------------------------------------------
module gripper_motor_support()
{
    difference(){
        cube(gripper_motor_support_size);
        
        translate ([gripper_motor_support_size[0] / 2, gripper_motor_support_size[1] / 2, 0] - display_tolerance_z) {
        // middle motor hole
            cylinder(h = 2.4 + display_tolerance, r = nema_14_39BYGL215A_top_radius + 0.1, $fn = 40);
            cylinder(h = gripper_motor_support_size[2] + 2 * display_tolerance, r = 5, $fn = 40);
        // screw holes for fixing the motor
            for (i = [1 : 4])
                translate (nema_14_39BYGL215A_screw_hole_position[i]){
                    cylinder (h = gripper_motor_support_size[2] + 2 * display_tolerance, r = m3_screw_radius, $fn = 20);
                    translate([0, 0, gripper_motor_support_size[2]])
                    cylinder (h = 2, r2 = m3_nut_radius, r1 = m3_screw_radius, $fn = 20);
                }
        }
        // holes for fixing the motor support to lateral support
        translate ([0, 9, gripper_motor_support_size[2] / 2 + 0.5] - display_tolerance_x) rotate ([0, 90, 0]) cylinder (h = gripper_motor_support_size[1] + 2 * display_tolerance, r = m3_screw_radius, $fn = 20);
        translate ([0, gripper_motor_support_size[1] - 9, gripper_motor_support_size[2] / 2 + 0.5] - display_tolerance_x) rotate ([0, 90, 0]) cylinder (h = gripper_motor_support_size[1] + 2 * display_tolerance, r = m3_screw_radius, $fn = 20);
    }
}
//-----------------------------------------------------------------------------------
module gripper(gripper_angle = 5)
{
    
    pusher_offset = 31;
// bottom
    gripper_lateral_support();
    // top
    translate([0, 0, gripper_motor_support_size[0] + gripper_lateral_sheet_size[2]]) gripper_lateral_support();
    
    
    // pusher
    translate ([U_pusher_height + pusher_offset + sin(gripper_angle) * finger_first_segment_length, -U_pusher_base_size[1] / 2 + gripper_lateral_sheet_size[1] / 2, gripper_lateral_sheet_size[2] + spacer_between_fingers]) rotate ([0, -90, 0]) U_pusher();
    
    // pusher screw
    translate ([pusher_offset + sin(gripper_angle) * finger_first_segment_length, gripper_lateral_sheet_size[1] / 2, -5]) cylinder (h = 55, r = m4_screw_radius, $fn = 20);
    
    // lateral screw
    translate ([5, -5, -5]) cylinder (h = 55, r = m4_screw_radius, $fn = 20);
    // lateral screw
    translate ([5, gripper_lateral_sheet_size[1] + 5, -5]) cylinder (h = 55, r = m4_screw_radius, $fn = 20);
    
    // motor support
    translate([gripper_lateral_sheet_size[0], 0, 4]) rotate([0, -90, 0]) gripper_motor_support();
    
    // motor
    translate([gripper_lateral_sheet_size[0] + nema_14_39BYGL215A_height, gripper_lateral_sheet_size[1] / 2, gripper_lateral_sheet_size[2] + gripper_motor_support_size[0] / 2]) rotate ([0, -90, 0]) nema_14_39BYGL215A();
    
    // fingers
    translate ([5, gripper_lateral_sheet_size[1] + 5, 0])
    rotate ([0, 0, gripper_angle + 180 - finger_angle]) 
    translate ([-finger_first_segment_length, 0, gripper_lateral_sheet_size[2] + spacer_between_fingers + U_finger_thick + spacer_between_fingers]) 
    finger();
    
    // finger with button support
    translate ([5, - 5, 0])
    rotate ([0, 0, -gripper_angle + finger_angle]) 
    mirror([1, 0, 0])
    translate ([-finger_first_segment_length, 0, gripper_lateral_sheet_size[2] + spacer_between_fingers + U_finger_thick + spacer_between_fingers + finger_thick + spacer_between_fingers]) 
    finger_with_button_support ();

// touch fingers
    translate ([5, - 5, 0])
    rotate ([0, 0, -gripper_angle - 10]) 
    mirror([1, 0, 0])
    translate ([0, 0, gripper_lateral_sheet_size[2] + spacer_between_fingers + U_finger_thick + spacer_between_fingers ]) 
    fore_fingers();
    
    // second finger
        translate ([5, gripper_lateral_sheet_size[1] + 5, 0])
    rotate ([0, 0, gripper_angle + 180 - finger_angle]) 
    translate ([-finger_first_segment_length, 0, gripper_lateral_sheet_size[2] + spacer_between_fingers + U_finger_thick + spacer_between_fingers + finger_thick + spacer_between_fingers  + finger_thick + spacer_between_fingers]) finger();

}
//-----------------------------------------------------------------------------------
module gripper_c920_support()
{
    difference(){
        union(){
            c920_support();
            translate([c920_dist_between_holder_holes / 2 + c920_depth / 2 - gripper_motor_support_size[1] / 2, 0, 0]) 
            difference(){
                cube([gripper_motor_support_size[1], 12.5, 13]);
            // bone hole
                translate ([gripper_motor_support_size[1] / 2 - 5, 3, 0] - display_tolerance_z) cube([10, 10, 13] + 2 * display_tolerance_yz);
            }
        }
        // gripper screw holes
        translate([c920_dist_between_holder_holes / 2 + c920_depth / 2 - 15, 0, 6.5] - display_tolerance_y) rotate ([-90, 0, 0]) cylinder (h = 13 + 2 * display_tolerance, r = m3_screw_radius, $fn = 20);
        translate([c920_dist_between_holder_holes / 2 + c920_depth / 2 + 15, 0, 6.5] - display_tolerance_y) rotate ([-90, 0, 0]) cylinder (h = 13 + 2 * display_tolerance, r = m3_screw_radius, $fn = 20);
                
        // sunken screw holes
        translate([c920_dist_between_holder_holes / 2 + c920_depth / 2 - 15, 0, 6.5] - display_tolerance_y) rotate ([-90, 0, 0]) cylinder (h = 2, r2 = m3_screw_radius, r1 = m3_nut_radius, $fn = 20);
        translate([c920_dist_between_holder_holes / 2 + c920_depth / 2 + 15, 0, 6.5] - display_tolerance_y) rotate ([-90, 0, 0]) cylinder (h = 2, r2 = m3_screw_radius, r1 = m3_nut_radius, $fn = 20);
    }
}
//-----------------------------------------------------------------------------------

//gripper(-10);


//fore_fingers();  // 1x

//gripper_lateral_support(); // 2x

//U_pusher(); // 1x

//finger(); // 2x
//finger_with_button_support(); // 1x


//gripper_motor_support();//1x

gripper_c920_support();
